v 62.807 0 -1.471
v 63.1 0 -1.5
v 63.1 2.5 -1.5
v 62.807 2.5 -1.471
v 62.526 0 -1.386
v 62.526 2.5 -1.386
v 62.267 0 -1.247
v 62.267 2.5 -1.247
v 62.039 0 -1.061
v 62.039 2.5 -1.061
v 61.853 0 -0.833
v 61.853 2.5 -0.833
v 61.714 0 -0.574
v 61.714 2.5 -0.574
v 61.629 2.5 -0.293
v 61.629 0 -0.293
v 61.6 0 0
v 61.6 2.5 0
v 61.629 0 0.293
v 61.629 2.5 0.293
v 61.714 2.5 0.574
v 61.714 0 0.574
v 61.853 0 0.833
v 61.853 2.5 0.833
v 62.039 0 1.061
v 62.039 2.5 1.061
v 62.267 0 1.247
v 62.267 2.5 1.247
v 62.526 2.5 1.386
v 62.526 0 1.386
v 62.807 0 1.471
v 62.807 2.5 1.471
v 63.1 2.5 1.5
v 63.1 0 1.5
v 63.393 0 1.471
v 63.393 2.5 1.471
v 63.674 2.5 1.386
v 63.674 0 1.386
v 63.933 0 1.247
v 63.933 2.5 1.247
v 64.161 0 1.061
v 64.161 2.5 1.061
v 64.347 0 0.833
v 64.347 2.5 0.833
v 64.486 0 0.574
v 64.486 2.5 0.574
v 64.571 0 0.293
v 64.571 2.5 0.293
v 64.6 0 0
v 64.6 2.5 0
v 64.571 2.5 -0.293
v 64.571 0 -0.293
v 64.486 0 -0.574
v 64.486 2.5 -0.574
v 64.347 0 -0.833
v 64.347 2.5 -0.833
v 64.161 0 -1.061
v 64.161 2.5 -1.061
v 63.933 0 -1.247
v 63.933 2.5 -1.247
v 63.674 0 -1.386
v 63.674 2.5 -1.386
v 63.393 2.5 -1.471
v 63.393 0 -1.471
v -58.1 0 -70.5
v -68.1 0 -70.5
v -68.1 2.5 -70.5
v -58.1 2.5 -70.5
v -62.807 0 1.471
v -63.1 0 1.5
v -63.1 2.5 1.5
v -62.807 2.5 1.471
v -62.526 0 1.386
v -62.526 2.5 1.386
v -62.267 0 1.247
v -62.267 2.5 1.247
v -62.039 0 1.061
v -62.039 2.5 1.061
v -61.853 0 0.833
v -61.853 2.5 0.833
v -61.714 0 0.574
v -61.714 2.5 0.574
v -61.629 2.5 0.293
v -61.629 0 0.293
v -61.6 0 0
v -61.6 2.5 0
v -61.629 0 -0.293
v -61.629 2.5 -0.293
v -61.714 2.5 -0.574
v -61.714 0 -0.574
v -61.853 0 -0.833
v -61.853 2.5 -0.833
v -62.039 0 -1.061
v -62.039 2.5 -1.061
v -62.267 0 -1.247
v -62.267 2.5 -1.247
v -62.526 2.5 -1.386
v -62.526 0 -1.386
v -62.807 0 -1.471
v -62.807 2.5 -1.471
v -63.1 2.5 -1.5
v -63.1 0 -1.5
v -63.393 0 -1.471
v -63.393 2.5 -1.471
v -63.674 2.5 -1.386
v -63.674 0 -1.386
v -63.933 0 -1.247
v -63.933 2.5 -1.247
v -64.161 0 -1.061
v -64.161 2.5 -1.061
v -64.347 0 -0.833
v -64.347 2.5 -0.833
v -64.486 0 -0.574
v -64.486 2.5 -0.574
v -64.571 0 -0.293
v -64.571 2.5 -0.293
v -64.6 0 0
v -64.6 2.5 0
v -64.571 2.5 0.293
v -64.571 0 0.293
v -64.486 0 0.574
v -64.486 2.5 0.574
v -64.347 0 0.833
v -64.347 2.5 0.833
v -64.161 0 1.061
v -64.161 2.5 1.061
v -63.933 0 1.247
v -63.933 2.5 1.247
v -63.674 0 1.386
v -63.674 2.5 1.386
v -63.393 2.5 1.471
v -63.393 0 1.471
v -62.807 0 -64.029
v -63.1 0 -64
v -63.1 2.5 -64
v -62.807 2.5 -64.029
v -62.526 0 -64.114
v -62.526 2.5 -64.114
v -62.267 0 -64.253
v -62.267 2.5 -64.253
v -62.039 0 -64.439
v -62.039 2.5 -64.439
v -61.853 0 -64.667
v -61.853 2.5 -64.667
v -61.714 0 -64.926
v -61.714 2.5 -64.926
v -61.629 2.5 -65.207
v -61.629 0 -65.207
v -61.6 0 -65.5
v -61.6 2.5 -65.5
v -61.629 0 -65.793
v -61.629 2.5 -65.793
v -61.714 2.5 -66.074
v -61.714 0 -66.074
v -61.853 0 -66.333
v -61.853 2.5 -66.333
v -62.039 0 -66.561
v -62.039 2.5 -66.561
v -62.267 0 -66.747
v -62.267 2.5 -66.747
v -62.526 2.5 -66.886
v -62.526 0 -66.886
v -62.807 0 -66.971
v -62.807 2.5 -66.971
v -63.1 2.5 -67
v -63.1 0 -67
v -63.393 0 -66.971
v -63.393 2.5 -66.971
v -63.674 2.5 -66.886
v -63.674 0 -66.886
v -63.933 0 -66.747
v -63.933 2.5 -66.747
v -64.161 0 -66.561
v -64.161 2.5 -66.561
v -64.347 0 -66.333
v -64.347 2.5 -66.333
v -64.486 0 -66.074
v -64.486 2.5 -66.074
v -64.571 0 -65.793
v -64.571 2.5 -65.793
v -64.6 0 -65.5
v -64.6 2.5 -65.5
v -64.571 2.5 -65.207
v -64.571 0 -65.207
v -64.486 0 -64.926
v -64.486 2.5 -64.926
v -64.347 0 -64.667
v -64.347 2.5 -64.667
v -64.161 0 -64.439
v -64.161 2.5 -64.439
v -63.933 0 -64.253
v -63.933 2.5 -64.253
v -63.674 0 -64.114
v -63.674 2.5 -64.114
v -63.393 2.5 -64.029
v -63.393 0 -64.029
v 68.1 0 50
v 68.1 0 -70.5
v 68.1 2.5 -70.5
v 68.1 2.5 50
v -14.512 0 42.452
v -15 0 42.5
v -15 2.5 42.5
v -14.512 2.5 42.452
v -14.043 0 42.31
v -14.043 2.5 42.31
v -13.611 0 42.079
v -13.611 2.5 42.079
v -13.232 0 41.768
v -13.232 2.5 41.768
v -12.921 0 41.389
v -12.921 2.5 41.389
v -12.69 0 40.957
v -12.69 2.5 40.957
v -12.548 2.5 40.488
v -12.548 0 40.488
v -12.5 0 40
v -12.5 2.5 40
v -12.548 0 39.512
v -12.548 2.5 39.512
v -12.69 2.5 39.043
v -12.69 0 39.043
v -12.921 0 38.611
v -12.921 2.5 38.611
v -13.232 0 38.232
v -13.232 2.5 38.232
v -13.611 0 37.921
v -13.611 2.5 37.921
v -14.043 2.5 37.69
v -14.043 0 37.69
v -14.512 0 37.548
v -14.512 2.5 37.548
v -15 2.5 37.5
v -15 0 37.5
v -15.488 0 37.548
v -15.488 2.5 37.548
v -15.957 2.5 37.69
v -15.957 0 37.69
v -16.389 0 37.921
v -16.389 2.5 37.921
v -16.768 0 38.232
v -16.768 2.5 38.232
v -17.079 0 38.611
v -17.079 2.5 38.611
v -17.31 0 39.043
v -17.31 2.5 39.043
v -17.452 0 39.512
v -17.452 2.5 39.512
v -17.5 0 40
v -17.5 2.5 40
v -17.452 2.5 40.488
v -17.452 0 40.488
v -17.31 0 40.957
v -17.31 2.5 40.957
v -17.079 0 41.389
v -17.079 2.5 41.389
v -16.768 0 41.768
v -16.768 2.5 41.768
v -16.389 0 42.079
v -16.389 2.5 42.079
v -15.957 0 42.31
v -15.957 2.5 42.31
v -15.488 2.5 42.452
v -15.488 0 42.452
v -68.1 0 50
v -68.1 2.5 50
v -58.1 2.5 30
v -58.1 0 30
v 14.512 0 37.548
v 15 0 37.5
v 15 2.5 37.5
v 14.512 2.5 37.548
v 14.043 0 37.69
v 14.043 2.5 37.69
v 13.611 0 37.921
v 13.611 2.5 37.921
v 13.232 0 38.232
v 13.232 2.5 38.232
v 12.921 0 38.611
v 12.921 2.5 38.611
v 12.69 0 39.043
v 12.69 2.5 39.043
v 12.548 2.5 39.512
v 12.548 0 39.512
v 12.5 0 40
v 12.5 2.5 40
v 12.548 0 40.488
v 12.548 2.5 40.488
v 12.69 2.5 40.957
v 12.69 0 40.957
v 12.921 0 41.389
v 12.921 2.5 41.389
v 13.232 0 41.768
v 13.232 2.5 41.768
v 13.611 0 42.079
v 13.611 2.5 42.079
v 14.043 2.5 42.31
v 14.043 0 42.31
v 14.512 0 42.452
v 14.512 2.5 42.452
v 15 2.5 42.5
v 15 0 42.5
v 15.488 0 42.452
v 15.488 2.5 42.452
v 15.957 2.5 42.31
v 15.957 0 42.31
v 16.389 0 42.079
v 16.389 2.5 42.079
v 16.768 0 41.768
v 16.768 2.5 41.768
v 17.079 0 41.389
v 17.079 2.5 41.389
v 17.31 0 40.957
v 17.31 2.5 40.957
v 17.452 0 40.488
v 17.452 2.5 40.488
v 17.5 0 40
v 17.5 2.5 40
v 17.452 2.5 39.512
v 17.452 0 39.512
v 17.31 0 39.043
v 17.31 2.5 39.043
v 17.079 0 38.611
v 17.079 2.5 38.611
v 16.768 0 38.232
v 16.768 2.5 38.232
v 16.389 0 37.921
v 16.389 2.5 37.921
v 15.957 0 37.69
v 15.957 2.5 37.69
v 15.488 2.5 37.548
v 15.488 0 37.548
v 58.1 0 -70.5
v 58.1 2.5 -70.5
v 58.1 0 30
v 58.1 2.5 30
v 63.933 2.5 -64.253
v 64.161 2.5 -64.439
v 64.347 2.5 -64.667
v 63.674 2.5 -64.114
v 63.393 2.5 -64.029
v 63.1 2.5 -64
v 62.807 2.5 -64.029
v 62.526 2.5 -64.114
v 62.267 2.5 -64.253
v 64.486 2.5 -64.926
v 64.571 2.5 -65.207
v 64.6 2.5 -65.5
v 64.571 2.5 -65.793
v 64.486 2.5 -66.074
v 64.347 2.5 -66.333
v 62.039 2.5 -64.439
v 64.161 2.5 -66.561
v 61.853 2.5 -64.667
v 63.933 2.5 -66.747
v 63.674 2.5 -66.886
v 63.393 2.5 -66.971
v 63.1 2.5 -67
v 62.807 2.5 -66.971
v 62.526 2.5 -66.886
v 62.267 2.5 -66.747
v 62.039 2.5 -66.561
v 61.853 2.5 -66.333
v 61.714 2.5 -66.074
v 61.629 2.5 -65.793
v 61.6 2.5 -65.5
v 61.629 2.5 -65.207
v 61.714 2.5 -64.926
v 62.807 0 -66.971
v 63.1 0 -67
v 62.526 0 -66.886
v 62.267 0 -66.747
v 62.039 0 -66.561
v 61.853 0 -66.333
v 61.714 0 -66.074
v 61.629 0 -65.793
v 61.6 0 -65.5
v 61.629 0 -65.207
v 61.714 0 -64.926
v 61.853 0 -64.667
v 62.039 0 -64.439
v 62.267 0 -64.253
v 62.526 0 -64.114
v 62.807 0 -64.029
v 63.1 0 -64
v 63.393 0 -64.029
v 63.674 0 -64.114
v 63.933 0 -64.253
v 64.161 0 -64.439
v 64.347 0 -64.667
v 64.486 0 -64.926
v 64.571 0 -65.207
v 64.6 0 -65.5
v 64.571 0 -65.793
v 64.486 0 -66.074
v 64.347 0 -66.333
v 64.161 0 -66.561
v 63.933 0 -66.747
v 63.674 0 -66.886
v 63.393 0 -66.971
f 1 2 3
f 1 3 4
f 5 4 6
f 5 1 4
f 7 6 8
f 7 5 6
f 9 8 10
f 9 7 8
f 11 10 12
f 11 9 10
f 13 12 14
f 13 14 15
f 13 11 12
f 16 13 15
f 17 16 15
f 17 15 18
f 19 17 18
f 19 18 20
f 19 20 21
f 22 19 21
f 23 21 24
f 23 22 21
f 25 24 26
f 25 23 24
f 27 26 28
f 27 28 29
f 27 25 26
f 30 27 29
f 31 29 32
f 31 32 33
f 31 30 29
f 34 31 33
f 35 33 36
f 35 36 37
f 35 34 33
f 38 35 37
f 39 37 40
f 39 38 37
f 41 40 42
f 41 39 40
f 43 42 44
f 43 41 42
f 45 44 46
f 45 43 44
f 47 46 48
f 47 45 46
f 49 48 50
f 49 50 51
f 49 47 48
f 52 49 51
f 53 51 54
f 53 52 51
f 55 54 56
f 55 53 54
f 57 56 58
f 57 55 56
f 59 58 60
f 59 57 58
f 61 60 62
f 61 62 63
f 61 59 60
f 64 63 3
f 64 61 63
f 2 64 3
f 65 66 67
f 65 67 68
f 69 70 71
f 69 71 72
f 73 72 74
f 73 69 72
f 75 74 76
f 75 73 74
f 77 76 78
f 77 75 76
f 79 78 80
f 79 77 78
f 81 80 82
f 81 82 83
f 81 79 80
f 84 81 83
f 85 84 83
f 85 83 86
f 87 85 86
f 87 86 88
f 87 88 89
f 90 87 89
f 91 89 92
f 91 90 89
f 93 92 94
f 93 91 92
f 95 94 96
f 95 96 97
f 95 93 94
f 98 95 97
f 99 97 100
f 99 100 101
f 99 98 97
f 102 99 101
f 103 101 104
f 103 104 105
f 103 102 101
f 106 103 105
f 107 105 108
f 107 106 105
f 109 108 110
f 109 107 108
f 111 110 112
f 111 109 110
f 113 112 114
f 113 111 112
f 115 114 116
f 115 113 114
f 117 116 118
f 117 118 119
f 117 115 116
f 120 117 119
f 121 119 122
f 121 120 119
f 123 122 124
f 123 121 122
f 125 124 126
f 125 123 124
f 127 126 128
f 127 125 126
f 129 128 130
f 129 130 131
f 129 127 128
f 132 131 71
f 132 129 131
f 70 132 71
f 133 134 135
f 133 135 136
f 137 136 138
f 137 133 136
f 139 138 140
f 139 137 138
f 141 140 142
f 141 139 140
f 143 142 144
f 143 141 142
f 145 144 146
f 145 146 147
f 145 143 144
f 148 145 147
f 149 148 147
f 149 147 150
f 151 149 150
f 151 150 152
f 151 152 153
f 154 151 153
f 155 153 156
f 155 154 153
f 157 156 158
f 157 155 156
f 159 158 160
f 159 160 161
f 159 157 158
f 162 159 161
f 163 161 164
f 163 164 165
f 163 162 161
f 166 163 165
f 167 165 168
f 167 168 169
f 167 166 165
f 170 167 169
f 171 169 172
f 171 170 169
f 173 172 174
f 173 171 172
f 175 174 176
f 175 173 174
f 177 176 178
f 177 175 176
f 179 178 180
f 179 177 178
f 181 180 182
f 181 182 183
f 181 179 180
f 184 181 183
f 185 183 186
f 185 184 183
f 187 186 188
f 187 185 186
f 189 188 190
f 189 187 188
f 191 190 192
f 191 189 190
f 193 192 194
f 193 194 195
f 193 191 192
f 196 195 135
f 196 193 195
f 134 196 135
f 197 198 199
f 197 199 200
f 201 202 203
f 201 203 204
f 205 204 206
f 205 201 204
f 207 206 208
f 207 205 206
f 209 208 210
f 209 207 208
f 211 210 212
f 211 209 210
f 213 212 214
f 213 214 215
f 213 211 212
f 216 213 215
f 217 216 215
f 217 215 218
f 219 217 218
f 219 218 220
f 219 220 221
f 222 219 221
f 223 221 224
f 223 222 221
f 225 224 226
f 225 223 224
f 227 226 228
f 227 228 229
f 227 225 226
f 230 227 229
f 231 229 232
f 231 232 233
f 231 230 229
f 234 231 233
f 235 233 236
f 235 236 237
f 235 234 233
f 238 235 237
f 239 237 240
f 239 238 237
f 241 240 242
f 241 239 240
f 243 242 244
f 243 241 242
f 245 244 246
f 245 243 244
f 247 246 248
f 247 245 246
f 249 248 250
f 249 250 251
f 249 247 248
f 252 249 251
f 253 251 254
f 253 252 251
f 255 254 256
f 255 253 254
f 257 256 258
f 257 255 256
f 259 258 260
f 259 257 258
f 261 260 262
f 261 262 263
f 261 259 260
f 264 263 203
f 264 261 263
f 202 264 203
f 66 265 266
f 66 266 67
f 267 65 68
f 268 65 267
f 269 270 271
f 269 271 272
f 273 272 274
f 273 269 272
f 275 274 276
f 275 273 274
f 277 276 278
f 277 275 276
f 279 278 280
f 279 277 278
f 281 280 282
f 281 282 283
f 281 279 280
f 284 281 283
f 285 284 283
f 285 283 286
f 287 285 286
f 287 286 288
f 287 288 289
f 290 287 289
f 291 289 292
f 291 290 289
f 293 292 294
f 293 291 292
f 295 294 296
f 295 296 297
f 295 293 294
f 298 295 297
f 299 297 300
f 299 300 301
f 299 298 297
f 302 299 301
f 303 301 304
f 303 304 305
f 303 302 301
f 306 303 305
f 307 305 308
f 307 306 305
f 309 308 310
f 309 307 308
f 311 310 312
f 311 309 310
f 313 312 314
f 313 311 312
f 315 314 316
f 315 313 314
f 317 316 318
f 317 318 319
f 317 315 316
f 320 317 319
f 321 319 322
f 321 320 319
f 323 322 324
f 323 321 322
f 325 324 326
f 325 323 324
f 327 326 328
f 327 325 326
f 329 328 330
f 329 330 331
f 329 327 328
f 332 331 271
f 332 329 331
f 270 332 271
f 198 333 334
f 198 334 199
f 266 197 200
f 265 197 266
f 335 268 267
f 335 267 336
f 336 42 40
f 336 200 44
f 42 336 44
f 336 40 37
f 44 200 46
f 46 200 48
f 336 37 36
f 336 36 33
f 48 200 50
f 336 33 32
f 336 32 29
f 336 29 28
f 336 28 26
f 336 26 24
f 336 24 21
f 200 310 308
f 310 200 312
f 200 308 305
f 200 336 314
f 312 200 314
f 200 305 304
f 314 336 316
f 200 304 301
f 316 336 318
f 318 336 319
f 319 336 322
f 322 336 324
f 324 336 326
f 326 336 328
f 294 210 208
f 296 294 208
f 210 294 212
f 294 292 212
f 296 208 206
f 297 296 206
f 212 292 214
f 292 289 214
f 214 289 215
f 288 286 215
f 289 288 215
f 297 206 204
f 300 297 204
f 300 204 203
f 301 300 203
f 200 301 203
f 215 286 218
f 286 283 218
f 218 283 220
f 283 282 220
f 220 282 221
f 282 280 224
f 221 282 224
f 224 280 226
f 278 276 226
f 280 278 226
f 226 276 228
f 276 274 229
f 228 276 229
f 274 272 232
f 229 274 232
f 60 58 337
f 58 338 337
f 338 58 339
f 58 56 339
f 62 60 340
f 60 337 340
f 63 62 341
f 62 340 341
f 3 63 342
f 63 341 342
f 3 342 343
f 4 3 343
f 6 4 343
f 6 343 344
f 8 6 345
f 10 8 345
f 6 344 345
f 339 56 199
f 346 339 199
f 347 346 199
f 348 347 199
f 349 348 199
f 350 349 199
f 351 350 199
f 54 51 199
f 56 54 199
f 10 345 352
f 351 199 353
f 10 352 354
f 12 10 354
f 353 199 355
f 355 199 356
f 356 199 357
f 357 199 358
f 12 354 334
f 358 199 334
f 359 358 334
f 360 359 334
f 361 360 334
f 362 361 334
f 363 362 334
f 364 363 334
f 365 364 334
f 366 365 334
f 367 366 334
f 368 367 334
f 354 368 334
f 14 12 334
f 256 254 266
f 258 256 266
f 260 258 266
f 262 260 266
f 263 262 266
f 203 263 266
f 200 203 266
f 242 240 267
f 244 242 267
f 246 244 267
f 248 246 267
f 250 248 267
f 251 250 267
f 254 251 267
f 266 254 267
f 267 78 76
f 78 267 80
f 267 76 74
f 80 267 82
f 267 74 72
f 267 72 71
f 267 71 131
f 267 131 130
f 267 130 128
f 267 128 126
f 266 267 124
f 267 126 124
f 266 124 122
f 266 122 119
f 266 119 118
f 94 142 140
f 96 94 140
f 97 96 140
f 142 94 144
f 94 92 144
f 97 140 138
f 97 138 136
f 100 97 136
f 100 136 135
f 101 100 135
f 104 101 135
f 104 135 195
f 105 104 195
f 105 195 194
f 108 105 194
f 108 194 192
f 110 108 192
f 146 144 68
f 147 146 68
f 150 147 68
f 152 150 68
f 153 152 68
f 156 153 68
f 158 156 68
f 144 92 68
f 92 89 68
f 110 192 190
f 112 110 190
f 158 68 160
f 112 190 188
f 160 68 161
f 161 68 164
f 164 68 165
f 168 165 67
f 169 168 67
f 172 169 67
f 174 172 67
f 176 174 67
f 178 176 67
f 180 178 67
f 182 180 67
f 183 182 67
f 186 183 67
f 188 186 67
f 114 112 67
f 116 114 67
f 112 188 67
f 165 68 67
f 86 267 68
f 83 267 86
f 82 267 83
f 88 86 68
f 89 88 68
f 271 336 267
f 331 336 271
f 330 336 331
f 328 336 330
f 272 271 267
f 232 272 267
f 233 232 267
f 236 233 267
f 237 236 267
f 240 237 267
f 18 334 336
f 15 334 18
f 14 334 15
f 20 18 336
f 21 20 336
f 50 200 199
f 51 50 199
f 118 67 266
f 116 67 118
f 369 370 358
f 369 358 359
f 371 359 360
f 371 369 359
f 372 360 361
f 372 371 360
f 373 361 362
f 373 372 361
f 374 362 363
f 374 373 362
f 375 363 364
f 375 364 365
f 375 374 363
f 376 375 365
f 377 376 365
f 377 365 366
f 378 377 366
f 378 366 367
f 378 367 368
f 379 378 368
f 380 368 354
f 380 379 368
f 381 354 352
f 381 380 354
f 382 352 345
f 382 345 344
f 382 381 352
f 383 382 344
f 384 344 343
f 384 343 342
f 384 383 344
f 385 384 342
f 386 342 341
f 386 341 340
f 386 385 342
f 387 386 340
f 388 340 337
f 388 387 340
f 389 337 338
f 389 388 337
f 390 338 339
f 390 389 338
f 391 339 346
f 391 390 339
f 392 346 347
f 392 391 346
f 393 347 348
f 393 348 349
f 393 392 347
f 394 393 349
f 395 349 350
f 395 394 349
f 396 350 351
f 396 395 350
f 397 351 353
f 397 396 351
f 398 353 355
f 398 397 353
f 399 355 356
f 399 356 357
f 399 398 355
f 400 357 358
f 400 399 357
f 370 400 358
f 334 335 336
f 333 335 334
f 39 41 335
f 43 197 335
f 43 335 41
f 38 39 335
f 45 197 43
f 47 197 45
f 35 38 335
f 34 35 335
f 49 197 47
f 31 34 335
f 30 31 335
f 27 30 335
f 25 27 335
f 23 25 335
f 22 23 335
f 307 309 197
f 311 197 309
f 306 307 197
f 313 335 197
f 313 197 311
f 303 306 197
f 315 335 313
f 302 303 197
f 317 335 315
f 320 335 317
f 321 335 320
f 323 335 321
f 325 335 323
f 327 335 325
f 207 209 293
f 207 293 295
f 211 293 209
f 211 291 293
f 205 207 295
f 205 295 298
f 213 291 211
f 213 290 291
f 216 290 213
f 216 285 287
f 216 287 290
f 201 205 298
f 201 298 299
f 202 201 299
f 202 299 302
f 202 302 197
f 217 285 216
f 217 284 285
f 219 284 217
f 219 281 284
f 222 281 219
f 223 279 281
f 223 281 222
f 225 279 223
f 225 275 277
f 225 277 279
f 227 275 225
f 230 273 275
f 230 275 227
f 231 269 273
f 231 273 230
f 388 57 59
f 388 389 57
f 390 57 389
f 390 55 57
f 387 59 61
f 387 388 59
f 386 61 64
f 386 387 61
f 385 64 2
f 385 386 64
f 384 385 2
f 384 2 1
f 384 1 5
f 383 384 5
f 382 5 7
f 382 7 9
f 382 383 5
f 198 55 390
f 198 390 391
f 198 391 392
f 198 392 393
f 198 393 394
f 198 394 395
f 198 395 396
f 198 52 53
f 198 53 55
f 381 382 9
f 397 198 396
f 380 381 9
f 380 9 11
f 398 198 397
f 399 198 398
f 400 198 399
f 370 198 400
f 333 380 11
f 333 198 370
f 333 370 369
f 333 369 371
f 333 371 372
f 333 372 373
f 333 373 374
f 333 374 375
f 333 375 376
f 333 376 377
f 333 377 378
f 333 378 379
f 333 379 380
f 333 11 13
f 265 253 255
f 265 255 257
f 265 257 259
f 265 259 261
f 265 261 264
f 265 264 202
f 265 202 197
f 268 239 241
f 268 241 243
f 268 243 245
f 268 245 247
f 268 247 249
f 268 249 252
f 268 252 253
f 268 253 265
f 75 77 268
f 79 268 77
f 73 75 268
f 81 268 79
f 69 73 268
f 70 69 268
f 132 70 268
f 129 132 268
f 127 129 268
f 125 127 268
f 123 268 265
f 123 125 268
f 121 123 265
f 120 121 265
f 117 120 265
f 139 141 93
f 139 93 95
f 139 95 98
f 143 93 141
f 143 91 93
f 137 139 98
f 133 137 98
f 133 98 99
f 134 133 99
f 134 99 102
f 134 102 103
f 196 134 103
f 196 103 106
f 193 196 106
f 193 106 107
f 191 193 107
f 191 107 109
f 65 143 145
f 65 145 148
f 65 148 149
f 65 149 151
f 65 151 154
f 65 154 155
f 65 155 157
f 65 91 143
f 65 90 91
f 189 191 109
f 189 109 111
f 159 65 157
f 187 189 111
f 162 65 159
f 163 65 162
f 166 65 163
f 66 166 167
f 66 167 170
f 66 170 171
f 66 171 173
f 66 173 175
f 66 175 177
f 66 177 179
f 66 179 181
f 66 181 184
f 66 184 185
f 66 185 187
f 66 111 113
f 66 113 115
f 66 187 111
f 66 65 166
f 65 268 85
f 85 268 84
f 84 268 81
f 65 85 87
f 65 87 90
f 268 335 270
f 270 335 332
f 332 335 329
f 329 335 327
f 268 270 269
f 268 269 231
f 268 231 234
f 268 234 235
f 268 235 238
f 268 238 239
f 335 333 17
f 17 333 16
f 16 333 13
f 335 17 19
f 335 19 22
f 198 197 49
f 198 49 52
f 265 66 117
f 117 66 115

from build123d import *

# Parameters (mm, degrees)
SKETCH3_R           = 1.5
SKETCH3_R_2         = 2.5
BOSS_EXTRUDE2_DEPTH = 2.5


with BuildPart() as part:
    # Sketch3 → Boss-Extrude2 (new body)
    with BuildSketch(Plane(origin=(0, 0, 0), x_dir=(1, 0, 0), z_dir=(0, 1, 0))):
        Polygon((-68.1, 70.5), (-58.1, 70.5), (-58.1, -30), (58.1, -30), (58.1, 70.5), (68.1, 70.5), (68.1, -50), (-68.1, -50), align=None)
        with Locations(Location((-63.1, 65.5, 0), (0, 0, 270))):
            Circle(SKETCH3_R, mode=Mode.SUBTRACT)
        with Locations(Location((-63.1, 0, 0), (0, 0, 270))):
            Circle(SKETCH3_R, mode=Mode.SUBTRACT)
        with Locations(Location((63.1, 0, 0), (0, 0, 90))):
            Circle(SKETCH3_R, mode=Mode.SUBTRACT)
        with Locations(Location((63.1, 65.5, 0), (0, 0, 90))):
            Circle(SKETCH3_R, mode=Mode.SUBTRACT)
        with Locations(Location((-15, -40, 0), (0, 0, 270))):
            Circle(SKETCH3_R_2, mode=Mode.SUBTRACT)
        with Locations(Location((15, -40, 0), (0, 0, 90))):
            Circle(SKETCH3_R_2, mode=Mode.SUBTRACT)
    extrude(amount=BOSS_EXTRUDE2_DEPTH)


solid = part.part
